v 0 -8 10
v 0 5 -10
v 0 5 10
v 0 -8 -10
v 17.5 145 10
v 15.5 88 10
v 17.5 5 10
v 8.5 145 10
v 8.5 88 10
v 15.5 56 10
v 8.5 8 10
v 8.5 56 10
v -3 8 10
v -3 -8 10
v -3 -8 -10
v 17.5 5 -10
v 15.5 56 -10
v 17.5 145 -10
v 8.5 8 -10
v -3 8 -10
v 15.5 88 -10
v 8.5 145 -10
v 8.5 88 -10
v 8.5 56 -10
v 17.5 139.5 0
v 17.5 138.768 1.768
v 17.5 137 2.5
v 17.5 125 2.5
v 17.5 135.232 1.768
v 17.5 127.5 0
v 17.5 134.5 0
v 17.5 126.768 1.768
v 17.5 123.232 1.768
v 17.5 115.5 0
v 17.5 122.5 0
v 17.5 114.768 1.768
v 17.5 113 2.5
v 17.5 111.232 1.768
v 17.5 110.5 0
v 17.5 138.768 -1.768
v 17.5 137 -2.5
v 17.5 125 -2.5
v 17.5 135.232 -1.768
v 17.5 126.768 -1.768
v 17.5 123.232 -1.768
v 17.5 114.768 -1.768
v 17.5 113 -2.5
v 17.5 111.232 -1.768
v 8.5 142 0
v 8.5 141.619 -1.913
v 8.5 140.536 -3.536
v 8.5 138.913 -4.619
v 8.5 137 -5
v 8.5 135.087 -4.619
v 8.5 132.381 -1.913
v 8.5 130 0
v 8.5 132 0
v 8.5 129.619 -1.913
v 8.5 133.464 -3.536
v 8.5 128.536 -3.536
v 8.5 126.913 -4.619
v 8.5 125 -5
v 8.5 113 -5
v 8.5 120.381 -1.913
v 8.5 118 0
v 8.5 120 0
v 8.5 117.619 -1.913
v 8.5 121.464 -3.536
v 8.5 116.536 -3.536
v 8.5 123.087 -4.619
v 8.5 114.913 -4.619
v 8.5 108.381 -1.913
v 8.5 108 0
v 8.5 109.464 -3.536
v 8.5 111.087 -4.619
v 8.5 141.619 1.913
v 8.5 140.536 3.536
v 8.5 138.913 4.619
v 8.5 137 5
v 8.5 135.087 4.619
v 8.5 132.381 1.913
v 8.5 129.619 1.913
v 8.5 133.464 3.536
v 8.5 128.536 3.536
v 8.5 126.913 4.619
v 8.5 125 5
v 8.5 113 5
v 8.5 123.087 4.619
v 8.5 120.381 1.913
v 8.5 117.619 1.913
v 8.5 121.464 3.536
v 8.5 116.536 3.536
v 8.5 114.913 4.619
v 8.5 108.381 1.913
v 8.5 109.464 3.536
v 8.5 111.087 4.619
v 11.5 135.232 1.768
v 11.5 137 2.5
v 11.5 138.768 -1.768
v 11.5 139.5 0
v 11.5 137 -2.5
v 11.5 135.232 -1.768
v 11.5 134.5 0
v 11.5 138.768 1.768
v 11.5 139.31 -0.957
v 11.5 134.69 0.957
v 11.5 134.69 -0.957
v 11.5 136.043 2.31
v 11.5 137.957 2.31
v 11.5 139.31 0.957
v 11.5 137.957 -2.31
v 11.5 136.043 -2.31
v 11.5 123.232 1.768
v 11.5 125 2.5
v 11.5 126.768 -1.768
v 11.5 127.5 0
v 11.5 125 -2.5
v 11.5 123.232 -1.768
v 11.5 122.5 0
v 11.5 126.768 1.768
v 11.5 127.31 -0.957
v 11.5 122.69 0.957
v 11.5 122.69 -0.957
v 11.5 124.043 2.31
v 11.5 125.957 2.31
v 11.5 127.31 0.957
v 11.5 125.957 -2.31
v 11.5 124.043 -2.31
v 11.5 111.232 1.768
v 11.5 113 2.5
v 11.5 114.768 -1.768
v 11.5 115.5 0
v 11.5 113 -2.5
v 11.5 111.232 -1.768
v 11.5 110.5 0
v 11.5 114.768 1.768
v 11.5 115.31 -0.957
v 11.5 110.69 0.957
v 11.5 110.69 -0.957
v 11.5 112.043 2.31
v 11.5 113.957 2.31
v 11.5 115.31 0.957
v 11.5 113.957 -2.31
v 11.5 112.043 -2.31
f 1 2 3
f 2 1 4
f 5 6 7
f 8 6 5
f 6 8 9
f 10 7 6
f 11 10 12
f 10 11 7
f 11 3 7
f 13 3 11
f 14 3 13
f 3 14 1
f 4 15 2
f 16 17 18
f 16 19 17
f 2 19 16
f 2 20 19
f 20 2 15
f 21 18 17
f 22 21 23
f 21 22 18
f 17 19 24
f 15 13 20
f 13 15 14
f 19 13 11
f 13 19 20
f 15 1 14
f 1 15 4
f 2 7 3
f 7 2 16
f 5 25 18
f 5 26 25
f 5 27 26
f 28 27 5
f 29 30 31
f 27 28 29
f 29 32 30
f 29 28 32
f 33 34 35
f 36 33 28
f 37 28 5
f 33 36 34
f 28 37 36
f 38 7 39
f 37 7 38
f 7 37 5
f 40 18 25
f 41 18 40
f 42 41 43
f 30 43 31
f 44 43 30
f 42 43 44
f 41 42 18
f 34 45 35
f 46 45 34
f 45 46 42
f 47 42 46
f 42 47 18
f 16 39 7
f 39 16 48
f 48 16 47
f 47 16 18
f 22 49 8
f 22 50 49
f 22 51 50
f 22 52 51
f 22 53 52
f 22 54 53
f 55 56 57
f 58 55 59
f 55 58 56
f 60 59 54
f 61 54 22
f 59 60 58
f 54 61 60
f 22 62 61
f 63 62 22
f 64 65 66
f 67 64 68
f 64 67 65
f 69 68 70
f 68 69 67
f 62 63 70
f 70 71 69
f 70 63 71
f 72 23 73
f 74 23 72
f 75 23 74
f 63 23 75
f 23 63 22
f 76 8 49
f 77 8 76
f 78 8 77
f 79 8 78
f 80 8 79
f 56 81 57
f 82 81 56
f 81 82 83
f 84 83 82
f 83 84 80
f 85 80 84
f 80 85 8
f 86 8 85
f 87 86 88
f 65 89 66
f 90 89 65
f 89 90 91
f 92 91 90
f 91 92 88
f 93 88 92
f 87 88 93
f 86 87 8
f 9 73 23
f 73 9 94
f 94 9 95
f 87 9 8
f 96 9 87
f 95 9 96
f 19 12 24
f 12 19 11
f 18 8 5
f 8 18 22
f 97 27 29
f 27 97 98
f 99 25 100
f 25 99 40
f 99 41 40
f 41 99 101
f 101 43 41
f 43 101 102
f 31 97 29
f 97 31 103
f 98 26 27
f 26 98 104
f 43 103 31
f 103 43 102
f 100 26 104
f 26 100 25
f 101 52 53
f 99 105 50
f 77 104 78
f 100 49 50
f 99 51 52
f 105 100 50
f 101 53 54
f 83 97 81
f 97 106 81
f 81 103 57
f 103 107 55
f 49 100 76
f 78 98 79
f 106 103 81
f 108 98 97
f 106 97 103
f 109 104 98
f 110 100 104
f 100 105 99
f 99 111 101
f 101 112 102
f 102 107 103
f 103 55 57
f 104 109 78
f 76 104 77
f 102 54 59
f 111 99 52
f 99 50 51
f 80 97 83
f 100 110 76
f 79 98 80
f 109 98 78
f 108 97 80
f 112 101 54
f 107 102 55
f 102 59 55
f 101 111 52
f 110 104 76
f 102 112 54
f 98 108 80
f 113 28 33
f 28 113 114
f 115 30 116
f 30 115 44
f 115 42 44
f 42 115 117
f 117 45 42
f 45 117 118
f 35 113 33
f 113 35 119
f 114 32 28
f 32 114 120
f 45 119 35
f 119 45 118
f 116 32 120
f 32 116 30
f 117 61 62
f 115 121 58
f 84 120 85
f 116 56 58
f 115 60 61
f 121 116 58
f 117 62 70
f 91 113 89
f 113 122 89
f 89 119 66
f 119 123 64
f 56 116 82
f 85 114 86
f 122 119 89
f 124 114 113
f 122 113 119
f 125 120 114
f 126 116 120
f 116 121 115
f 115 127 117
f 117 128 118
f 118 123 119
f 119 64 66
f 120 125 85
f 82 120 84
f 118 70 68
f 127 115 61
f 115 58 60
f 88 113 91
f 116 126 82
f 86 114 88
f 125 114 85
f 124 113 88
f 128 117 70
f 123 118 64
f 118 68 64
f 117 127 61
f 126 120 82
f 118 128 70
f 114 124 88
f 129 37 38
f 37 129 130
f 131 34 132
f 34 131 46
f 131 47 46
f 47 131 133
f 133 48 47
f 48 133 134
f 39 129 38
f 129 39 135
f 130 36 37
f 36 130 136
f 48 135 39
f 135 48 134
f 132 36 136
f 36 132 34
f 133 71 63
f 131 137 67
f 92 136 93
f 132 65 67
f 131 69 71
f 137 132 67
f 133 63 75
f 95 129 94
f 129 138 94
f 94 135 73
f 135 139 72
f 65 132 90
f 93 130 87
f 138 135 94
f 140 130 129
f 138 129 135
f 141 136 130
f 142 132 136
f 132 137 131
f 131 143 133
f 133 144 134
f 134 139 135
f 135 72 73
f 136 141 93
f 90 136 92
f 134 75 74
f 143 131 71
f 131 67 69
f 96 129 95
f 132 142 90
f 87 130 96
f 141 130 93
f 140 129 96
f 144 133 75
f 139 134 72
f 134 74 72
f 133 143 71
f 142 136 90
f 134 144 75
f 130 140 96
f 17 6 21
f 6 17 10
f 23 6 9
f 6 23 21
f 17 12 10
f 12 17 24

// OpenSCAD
widthOfHook = 20;
thicknessOfHook=3;
depthOfHook = 10;
lengthOfBar =140;
numberOfHoles = 3;
difference()
{
union(){
translate([-thicknessOfHook/2,0,0])
cube([thicknessOfHook, 16, widthOfHook], center=true);
translate([depthOfHook/2,8-thicknessOfHook/2,0])
cube([depthOfHook, thicknessOfHook, widthOfHook],center=true);

translate([depthOfHook+thicknessOfHook,lengthOfBar/2+16/2-thicknessOfHook,0])
cube([thicknessOfHook*3, lengthOfBar, widthOfHook], center=true);    
}
for(i=[0:numberOfHoles-1]){
translate([depthOfHook+thicknessOfHook,lengthOfBar-i*12-thicknessOfHook,0])
hole();
}
translate ([depthOfHook/2+7, 18+54,0]) 
cube ([7,32, widthOfHook],center =true ) ;
}


module hole(){
    rotate([0,90,0])
    color("red")
    union(){
    cylinder(h=thicknessOfHook*3, d=5, center=true);
    translate([0,0,-thicknessOfHook])
    #cylinder(h=thicknessOfHook, d1=10,d2=5,center=true);
    
    }
}
